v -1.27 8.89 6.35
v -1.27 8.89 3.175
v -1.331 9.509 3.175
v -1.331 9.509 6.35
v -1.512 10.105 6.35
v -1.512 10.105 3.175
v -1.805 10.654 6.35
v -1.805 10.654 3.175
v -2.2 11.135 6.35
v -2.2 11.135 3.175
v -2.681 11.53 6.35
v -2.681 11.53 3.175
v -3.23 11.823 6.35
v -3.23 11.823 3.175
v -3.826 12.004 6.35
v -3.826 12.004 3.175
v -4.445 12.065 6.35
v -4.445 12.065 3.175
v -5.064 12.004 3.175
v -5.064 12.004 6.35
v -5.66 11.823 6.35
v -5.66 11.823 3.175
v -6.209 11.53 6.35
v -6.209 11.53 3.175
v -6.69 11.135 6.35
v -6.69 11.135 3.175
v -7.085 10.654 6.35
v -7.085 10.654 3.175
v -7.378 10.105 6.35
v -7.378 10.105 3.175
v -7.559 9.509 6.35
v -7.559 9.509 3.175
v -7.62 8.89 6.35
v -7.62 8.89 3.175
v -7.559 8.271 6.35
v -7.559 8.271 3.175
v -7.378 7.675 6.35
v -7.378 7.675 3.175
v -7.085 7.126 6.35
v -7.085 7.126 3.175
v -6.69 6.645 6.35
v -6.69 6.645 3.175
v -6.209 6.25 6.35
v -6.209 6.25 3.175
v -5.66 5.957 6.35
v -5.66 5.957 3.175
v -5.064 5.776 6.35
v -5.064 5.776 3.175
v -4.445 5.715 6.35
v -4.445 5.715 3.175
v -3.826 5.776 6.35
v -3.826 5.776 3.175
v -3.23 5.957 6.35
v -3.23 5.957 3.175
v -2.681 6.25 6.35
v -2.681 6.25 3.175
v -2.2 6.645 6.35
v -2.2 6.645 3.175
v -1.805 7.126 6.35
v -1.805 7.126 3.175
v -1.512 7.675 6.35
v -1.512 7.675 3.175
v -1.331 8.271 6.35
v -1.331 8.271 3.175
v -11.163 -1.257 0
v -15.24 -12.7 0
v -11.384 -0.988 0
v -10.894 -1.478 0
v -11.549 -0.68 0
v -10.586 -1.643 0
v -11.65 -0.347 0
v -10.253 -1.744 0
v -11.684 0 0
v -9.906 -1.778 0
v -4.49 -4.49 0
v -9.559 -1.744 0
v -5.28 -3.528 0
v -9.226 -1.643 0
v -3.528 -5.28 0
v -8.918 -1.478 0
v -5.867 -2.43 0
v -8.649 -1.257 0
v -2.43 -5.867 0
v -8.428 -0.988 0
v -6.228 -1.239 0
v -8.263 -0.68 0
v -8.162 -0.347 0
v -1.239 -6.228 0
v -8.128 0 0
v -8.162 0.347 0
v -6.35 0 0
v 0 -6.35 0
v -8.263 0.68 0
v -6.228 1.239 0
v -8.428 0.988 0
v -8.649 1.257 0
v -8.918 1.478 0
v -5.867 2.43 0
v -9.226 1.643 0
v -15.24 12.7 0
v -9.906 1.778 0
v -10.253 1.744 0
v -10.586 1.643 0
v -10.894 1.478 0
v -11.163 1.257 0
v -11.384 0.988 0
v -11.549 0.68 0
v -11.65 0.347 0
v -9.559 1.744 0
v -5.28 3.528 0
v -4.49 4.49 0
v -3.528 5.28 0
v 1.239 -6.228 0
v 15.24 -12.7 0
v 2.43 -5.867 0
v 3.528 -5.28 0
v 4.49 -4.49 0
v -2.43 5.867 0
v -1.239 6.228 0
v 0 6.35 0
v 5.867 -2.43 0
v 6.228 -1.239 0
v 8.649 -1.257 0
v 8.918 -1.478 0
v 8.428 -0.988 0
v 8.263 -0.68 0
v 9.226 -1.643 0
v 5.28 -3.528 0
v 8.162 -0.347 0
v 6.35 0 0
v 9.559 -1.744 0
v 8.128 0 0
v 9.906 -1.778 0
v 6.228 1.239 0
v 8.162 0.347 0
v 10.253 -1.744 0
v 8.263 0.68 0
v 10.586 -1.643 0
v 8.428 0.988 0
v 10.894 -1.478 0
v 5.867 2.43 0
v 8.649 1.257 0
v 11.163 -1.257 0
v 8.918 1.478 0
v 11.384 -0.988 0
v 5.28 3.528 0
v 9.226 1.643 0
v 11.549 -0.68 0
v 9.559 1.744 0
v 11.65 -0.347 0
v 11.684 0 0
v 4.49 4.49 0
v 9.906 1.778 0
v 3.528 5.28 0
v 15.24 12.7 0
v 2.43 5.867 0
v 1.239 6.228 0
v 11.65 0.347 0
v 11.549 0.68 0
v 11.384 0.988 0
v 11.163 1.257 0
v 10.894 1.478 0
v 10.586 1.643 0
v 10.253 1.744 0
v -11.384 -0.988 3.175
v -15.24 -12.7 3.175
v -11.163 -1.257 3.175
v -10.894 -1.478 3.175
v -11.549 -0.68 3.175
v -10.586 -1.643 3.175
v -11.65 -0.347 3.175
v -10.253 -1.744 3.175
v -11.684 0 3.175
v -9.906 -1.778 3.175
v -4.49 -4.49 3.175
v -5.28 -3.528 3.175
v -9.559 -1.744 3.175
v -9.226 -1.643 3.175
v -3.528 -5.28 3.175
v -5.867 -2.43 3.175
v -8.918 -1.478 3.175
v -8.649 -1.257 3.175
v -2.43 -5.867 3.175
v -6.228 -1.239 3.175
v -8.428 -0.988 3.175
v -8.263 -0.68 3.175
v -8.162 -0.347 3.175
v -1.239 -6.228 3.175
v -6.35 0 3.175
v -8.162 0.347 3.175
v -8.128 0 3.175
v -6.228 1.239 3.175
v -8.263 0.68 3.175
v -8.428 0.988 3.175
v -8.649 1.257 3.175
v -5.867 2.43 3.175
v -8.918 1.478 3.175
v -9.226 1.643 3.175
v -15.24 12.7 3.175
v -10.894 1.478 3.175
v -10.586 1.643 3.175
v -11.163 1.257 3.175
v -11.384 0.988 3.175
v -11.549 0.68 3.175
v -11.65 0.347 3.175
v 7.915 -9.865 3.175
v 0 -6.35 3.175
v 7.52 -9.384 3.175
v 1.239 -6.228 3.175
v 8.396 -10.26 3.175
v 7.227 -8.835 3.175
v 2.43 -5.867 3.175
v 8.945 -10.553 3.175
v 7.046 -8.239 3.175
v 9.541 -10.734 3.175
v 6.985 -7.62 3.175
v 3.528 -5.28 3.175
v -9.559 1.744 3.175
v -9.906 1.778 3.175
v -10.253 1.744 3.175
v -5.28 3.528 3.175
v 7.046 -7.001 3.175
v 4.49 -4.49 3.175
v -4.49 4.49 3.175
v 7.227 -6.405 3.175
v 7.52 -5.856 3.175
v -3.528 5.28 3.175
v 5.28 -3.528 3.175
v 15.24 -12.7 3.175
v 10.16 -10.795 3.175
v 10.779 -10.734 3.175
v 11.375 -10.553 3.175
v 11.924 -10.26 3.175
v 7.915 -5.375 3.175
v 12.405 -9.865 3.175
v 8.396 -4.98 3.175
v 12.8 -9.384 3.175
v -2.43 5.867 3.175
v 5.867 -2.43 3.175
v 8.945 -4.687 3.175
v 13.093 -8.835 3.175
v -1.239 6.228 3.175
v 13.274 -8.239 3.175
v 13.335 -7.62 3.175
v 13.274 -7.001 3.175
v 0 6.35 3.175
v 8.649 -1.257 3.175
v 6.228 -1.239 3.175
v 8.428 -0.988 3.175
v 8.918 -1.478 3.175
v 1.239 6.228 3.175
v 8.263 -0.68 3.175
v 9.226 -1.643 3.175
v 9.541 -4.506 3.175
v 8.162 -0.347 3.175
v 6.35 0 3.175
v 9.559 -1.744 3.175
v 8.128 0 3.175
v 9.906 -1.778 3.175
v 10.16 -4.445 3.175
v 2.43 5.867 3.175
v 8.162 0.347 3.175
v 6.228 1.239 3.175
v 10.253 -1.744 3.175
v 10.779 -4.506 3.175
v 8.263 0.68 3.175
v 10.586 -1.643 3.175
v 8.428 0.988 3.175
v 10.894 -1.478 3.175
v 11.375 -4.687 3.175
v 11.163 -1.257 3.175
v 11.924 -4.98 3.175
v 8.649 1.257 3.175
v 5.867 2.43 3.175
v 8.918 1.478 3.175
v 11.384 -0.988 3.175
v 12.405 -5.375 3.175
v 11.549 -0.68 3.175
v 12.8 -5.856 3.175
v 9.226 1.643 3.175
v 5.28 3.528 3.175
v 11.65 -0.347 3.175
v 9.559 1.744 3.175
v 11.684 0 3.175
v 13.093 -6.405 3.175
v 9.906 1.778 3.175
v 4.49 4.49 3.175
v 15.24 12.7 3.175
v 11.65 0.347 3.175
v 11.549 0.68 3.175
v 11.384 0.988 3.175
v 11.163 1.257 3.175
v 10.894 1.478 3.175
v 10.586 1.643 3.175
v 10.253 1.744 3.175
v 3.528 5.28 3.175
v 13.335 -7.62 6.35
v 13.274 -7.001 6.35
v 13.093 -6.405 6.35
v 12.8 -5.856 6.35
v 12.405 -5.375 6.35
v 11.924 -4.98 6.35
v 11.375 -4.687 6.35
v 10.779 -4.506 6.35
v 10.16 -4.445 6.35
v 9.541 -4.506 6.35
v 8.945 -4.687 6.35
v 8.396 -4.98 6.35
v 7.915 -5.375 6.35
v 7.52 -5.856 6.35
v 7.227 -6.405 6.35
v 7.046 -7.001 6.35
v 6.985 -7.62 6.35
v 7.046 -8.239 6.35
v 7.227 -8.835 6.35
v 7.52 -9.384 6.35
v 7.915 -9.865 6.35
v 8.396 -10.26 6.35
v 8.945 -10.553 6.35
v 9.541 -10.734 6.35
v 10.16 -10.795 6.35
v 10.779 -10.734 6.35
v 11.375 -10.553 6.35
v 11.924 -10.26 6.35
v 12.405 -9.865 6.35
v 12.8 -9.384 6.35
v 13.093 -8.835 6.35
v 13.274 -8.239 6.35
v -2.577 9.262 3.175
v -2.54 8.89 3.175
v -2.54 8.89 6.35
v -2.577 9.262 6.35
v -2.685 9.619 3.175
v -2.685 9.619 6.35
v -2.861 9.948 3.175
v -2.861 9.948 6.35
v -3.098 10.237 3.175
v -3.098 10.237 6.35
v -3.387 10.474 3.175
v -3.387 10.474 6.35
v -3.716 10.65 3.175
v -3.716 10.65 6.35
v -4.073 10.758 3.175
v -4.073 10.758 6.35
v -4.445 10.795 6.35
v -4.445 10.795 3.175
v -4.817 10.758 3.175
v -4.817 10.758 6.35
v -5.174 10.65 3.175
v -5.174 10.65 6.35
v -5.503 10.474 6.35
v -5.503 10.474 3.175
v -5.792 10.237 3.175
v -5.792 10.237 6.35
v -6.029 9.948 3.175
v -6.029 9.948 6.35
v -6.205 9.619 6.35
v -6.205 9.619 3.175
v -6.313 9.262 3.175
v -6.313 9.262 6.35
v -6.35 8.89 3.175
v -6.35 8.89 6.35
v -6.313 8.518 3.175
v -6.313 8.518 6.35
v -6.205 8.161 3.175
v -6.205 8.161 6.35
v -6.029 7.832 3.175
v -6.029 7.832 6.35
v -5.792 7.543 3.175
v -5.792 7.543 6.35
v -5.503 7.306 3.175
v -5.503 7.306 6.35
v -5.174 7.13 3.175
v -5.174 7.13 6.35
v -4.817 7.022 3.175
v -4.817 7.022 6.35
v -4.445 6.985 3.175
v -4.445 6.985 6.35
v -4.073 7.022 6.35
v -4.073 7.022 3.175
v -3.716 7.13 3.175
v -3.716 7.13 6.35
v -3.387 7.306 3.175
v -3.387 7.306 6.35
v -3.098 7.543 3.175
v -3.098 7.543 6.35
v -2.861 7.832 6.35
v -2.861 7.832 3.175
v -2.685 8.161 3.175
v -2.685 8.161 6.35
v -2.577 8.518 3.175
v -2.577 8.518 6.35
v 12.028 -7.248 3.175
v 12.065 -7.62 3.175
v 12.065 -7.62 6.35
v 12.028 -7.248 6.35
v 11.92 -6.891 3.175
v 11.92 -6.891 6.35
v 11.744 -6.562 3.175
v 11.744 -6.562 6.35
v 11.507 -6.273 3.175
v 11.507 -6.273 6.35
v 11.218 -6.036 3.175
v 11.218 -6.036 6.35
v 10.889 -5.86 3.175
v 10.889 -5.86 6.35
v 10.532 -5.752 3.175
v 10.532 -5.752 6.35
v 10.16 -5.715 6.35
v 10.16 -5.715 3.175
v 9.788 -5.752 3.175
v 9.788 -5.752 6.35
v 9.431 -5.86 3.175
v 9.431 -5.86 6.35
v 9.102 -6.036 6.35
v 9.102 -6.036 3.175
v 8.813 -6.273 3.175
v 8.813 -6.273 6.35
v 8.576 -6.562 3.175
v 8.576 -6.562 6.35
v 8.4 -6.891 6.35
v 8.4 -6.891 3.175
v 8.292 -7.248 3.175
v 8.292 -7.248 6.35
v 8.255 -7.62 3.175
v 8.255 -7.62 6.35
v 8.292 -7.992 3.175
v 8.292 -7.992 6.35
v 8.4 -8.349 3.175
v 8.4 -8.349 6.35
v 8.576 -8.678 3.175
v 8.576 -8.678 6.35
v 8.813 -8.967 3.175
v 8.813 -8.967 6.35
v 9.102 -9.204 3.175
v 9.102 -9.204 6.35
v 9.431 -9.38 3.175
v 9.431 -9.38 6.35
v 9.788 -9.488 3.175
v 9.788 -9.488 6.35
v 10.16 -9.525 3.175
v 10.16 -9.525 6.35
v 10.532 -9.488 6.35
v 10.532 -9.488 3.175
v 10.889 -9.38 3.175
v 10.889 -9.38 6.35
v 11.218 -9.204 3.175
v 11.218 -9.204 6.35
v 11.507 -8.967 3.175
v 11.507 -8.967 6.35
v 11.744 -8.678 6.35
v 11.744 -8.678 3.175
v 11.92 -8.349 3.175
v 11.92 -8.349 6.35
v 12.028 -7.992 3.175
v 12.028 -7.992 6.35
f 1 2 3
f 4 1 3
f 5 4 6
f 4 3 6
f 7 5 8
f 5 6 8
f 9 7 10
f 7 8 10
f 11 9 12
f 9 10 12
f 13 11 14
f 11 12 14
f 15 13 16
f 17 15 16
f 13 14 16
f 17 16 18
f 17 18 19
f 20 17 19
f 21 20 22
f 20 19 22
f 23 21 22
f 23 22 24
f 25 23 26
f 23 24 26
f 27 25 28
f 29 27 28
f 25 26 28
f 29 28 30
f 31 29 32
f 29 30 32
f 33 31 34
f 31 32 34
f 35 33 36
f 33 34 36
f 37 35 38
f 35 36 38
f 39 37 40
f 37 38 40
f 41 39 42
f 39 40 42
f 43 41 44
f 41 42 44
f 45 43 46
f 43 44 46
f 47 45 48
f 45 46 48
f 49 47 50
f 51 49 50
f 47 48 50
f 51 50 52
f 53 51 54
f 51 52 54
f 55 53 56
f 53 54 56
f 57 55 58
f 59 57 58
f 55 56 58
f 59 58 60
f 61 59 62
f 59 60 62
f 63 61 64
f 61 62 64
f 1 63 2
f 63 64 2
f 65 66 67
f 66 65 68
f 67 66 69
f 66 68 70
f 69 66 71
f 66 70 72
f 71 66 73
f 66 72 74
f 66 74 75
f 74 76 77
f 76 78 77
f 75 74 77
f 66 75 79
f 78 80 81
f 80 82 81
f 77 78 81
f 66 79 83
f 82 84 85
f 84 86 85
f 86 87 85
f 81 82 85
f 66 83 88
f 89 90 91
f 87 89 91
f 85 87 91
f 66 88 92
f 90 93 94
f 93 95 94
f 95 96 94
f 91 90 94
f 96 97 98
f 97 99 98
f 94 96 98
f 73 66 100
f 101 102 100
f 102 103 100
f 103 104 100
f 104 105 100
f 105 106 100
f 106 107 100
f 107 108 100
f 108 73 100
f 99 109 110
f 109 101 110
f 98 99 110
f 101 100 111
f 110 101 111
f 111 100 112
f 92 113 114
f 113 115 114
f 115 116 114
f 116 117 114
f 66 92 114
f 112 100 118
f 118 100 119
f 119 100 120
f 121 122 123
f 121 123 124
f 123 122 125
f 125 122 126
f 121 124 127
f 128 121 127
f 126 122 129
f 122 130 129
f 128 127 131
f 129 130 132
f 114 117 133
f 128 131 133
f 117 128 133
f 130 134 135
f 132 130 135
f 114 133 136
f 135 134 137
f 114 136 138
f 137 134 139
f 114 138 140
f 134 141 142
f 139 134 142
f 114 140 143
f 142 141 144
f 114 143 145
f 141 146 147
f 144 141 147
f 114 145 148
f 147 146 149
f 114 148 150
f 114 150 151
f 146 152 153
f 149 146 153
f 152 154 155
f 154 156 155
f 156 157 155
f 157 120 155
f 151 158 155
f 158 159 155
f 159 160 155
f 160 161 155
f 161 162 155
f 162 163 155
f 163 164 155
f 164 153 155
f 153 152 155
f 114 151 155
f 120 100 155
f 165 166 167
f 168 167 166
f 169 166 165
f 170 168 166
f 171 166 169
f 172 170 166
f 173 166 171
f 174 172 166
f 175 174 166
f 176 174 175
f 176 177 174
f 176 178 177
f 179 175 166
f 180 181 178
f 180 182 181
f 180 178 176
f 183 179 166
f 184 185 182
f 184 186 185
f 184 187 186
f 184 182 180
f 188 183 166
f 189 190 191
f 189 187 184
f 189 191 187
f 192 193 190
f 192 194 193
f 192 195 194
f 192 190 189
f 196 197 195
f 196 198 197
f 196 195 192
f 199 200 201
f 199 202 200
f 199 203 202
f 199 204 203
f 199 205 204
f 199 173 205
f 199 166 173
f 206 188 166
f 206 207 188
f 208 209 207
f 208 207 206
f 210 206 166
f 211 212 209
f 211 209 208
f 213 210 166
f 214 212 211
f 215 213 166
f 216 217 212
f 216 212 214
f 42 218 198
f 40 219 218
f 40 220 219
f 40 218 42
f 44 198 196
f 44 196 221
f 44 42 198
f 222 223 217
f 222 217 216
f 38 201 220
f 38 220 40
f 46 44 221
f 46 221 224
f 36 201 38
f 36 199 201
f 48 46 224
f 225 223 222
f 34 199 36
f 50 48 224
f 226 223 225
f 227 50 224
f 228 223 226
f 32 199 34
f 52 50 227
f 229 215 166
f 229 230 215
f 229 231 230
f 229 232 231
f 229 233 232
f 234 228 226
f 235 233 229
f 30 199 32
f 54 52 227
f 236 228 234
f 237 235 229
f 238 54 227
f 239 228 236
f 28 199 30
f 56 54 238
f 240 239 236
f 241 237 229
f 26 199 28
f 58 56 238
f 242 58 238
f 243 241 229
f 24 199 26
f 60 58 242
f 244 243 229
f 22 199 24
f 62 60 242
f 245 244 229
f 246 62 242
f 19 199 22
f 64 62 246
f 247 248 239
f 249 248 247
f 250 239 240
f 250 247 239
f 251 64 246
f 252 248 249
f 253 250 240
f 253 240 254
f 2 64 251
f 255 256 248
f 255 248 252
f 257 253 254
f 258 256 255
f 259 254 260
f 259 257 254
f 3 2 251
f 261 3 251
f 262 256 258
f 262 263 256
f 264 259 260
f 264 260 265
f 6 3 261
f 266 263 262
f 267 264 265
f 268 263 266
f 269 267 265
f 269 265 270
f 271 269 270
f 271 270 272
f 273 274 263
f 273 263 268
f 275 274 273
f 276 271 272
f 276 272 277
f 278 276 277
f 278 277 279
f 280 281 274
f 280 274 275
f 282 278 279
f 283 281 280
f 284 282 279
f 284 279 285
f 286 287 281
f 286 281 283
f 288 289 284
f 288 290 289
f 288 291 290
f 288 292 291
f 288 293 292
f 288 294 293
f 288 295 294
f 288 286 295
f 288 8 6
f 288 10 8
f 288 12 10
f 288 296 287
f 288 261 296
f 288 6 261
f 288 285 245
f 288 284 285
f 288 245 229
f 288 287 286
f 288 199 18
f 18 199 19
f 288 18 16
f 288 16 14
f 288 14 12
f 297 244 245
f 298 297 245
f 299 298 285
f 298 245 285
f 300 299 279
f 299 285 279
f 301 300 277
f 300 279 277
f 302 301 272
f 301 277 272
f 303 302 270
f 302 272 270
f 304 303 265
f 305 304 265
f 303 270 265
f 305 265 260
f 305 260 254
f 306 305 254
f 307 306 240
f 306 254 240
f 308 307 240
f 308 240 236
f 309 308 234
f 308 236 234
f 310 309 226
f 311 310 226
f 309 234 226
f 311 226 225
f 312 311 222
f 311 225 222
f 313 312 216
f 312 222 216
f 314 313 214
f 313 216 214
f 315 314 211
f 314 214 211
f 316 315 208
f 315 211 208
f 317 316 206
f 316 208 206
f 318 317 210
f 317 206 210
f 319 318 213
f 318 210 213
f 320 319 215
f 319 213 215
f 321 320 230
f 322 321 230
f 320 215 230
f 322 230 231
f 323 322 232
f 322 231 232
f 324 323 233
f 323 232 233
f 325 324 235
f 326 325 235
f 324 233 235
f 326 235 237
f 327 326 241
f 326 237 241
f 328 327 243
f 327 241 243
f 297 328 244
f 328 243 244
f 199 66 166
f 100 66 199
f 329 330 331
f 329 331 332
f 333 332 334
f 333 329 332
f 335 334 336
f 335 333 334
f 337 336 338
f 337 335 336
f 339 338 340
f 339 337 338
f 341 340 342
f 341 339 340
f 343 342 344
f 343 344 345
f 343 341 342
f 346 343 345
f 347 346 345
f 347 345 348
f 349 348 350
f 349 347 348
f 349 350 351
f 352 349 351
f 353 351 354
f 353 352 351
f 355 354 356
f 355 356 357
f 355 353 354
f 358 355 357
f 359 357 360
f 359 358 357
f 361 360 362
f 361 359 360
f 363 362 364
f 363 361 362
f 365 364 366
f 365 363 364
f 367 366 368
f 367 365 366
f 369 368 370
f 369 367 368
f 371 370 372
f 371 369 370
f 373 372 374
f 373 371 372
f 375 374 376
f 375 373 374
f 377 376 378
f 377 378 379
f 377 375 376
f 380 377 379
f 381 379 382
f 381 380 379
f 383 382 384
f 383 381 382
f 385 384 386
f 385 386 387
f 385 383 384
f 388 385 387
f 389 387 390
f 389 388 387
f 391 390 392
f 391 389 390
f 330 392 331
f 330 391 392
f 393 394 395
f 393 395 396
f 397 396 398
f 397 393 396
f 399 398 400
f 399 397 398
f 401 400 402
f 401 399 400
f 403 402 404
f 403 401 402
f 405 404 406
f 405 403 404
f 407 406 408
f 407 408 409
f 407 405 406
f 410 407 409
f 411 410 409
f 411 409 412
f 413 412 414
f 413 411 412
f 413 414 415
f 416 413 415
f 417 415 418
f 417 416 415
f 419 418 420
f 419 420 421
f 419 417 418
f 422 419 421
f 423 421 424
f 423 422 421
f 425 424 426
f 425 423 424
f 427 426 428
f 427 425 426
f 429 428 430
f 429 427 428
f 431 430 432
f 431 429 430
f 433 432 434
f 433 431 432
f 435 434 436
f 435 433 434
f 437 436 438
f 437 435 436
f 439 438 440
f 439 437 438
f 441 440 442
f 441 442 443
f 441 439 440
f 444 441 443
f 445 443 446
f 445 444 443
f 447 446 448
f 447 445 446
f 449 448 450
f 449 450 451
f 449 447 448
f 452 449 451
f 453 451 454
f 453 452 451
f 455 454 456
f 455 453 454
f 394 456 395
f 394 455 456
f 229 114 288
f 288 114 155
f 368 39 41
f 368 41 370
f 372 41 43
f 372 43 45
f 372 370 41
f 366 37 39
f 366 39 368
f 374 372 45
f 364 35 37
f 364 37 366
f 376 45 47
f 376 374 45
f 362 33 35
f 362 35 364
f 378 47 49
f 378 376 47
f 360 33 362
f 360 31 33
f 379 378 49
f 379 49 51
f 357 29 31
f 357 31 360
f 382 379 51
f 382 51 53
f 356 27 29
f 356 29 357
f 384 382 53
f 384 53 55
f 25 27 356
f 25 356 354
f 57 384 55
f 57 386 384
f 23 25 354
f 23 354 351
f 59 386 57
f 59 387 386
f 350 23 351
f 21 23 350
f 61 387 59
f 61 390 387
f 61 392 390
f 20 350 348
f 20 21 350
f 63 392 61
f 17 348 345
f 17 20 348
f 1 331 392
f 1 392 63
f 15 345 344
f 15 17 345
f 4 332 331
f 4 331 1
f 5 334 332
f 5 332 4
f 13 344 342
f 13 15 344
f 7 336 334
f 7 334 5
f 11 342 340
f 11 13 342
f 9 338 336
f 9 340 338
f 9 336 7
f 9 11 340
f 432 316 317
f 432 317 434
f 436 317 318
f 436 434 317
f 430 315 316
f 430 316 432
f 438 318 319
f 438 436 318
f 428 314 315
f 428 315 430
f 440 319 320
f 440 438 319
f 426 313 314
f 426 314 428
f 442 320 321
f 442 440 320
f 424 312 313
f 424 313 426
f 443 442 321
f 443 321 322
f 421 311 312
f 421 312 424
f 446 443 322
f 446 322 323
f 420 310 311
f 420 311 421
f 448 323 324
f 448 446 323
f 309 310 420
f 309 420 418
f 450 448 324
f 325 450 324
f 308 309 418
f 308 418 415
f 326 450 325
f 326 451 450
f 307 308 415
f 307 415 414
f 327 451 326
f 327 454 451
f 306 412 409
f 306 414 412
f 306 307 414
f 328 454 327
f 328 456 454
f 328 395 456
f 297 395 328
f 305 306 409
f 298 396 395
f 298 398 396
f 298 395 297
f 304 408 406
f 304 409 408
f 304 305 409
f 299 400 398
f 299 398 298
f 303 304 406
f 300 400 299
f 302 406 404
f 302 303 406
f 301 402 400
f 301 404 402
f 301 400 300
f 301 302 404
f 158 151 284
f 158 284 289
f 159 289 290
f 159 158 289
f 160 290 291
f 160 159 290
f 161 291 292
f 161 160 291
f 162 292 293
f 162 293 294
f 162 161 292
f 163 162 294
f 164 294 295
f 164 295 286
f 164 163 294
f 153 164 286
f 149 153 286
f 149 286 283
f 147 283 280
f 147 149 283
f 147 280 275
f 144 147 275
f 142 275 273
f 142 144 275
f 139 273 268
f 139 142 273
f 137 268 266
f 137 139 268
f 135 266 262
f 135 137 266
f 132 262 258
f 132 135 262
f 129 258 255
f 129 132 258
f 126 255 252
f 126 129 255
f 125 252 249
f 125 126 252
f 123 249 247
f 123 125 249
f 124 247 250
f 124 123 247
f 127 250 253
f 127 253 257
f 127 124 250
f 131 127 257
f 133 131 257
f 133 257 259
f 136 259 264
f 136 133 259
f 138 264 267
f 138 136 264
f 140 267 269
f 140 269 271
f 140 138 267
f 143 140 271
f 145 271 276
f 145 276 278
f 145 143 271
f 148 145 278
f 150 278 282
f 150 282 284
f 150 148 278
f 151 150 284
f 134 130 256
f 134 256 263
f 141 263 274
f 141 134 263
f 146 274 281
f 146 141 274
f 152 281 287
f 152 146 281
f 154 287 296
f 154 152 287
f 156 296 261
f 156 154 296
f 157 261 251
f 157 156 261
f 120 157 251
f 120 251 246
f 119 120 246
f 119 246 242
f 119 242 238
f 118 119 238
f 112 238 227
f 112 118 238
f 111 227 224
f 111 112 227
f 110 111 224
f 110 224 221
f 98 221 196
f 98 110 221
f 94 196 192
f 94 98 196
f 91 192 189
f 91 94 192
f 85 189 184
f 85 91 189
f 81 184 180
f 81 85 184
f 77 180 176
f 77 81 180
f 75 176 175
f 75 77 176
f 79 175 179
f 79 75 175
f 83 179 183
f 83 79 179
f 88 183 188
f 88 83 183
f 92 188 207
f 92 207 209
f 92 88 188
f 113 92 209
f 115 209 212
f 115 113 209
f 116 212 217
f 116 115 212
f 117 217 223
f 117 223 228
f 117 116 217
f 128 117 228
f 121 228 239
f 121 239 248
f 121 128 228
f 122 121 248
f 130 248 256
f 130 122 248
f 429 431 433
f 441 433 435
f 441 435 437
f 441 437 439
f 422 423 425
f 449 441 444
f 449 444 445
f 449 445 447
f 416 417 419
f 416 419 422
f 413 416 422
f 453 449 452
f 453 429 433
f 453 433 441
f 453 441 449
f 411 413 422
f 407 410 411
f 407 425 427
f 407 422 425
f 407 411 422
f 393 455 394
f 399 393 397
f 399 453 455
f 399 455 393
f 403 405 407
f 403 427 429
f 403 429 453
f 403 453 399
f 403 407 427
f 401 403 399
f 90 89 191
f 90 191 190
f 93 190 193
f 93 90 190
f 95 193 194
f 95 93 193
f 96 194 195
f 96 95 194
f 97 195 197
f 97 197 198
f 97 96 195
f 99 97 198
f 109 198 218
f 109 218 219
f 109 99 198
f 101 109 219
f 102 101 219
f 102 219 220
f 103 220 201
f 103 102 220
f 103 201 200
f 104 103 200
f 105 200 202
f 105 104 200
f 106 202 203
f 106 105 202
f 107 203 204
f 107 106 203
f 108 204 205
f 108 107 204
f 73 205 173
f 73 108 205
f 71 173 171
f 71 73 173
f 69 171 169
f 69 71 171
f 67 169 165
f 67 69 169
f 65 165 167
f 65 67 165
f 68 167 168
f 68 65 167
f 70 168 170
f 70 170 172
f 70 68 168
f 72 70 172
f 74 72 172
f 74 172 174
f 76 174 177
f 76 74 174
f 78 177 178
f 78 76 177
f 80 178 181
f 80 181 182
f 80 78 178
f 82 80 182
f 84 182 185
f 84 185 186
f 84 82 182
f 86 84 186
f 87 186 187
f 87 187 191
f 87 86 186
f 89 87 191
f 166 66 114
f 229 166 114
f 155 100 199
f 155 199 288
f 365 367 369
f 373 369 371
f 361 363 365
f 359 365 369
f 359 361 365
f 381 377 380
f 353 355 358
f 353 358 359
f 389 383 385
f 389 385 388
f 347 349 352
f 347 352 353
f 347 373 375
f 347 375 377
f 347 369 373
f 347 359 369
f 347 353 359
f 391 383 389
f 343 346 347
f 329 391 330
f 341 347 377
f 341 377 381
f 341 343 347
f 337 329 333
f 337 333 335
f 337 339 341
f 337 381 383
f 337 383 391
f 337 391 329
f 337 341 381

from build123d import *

# Parameters (mm, degrees)
SKETCH1_W           = 30.48
SKETCH1_H           = 25.4
SKETCH1_R           = 6.35
SKETCH1_R_2         = 1.778
BOSS_EXTRUDE1_DEPTH = 3.175
SKETCH2_R           = 3.175
SKETCH2_R_2         = 1.905
BOSS_EXTRUDE2_DEPTH = 3.175


with BuildPart() as part:
    # Sketch1 → Boss-Extrude1 (new body)
    with BuildSketch(Plane.XY):
        Rectangle(SKETCH1_W, SKETCH1_H)
        Circle(SKETCH1_R, mode=Mode.SUBTRACT)
        with Locations((-9.906, 0)):
            Circle(SKETCH1_R_2, mode=Mode.SUBTRACT)
        with Locations((9.906, 0)):
            Circle(SKETCH1_R_2, mode=Mode.SUBTRACT)
    extrude(amount=BOSS_EXTRUDE1_DEPTH)

    # Sketch2 → Boss-Extrude2 (add)
    with BuildSketch(Plane.XY.offset(3.175)):
        with Locations((-4.445, 8.89)):
            Circle(SKETCH2_R)
        with Locations((-4.445, 8.89)):
            Circle(SKETCH2_R_2, mode=Mode.SUBTRACT)
        with Locations((10.16, -7.62)):
            Circle(SKETCH2_R)
        with Locations((10.16, -7.62)):
            Circle(SKETCH2_R_2, mode=Mode.SUBTRACT)
    extrude(amount=BOSS_EXTRUDE2_DEPTH)


solid = part.part
